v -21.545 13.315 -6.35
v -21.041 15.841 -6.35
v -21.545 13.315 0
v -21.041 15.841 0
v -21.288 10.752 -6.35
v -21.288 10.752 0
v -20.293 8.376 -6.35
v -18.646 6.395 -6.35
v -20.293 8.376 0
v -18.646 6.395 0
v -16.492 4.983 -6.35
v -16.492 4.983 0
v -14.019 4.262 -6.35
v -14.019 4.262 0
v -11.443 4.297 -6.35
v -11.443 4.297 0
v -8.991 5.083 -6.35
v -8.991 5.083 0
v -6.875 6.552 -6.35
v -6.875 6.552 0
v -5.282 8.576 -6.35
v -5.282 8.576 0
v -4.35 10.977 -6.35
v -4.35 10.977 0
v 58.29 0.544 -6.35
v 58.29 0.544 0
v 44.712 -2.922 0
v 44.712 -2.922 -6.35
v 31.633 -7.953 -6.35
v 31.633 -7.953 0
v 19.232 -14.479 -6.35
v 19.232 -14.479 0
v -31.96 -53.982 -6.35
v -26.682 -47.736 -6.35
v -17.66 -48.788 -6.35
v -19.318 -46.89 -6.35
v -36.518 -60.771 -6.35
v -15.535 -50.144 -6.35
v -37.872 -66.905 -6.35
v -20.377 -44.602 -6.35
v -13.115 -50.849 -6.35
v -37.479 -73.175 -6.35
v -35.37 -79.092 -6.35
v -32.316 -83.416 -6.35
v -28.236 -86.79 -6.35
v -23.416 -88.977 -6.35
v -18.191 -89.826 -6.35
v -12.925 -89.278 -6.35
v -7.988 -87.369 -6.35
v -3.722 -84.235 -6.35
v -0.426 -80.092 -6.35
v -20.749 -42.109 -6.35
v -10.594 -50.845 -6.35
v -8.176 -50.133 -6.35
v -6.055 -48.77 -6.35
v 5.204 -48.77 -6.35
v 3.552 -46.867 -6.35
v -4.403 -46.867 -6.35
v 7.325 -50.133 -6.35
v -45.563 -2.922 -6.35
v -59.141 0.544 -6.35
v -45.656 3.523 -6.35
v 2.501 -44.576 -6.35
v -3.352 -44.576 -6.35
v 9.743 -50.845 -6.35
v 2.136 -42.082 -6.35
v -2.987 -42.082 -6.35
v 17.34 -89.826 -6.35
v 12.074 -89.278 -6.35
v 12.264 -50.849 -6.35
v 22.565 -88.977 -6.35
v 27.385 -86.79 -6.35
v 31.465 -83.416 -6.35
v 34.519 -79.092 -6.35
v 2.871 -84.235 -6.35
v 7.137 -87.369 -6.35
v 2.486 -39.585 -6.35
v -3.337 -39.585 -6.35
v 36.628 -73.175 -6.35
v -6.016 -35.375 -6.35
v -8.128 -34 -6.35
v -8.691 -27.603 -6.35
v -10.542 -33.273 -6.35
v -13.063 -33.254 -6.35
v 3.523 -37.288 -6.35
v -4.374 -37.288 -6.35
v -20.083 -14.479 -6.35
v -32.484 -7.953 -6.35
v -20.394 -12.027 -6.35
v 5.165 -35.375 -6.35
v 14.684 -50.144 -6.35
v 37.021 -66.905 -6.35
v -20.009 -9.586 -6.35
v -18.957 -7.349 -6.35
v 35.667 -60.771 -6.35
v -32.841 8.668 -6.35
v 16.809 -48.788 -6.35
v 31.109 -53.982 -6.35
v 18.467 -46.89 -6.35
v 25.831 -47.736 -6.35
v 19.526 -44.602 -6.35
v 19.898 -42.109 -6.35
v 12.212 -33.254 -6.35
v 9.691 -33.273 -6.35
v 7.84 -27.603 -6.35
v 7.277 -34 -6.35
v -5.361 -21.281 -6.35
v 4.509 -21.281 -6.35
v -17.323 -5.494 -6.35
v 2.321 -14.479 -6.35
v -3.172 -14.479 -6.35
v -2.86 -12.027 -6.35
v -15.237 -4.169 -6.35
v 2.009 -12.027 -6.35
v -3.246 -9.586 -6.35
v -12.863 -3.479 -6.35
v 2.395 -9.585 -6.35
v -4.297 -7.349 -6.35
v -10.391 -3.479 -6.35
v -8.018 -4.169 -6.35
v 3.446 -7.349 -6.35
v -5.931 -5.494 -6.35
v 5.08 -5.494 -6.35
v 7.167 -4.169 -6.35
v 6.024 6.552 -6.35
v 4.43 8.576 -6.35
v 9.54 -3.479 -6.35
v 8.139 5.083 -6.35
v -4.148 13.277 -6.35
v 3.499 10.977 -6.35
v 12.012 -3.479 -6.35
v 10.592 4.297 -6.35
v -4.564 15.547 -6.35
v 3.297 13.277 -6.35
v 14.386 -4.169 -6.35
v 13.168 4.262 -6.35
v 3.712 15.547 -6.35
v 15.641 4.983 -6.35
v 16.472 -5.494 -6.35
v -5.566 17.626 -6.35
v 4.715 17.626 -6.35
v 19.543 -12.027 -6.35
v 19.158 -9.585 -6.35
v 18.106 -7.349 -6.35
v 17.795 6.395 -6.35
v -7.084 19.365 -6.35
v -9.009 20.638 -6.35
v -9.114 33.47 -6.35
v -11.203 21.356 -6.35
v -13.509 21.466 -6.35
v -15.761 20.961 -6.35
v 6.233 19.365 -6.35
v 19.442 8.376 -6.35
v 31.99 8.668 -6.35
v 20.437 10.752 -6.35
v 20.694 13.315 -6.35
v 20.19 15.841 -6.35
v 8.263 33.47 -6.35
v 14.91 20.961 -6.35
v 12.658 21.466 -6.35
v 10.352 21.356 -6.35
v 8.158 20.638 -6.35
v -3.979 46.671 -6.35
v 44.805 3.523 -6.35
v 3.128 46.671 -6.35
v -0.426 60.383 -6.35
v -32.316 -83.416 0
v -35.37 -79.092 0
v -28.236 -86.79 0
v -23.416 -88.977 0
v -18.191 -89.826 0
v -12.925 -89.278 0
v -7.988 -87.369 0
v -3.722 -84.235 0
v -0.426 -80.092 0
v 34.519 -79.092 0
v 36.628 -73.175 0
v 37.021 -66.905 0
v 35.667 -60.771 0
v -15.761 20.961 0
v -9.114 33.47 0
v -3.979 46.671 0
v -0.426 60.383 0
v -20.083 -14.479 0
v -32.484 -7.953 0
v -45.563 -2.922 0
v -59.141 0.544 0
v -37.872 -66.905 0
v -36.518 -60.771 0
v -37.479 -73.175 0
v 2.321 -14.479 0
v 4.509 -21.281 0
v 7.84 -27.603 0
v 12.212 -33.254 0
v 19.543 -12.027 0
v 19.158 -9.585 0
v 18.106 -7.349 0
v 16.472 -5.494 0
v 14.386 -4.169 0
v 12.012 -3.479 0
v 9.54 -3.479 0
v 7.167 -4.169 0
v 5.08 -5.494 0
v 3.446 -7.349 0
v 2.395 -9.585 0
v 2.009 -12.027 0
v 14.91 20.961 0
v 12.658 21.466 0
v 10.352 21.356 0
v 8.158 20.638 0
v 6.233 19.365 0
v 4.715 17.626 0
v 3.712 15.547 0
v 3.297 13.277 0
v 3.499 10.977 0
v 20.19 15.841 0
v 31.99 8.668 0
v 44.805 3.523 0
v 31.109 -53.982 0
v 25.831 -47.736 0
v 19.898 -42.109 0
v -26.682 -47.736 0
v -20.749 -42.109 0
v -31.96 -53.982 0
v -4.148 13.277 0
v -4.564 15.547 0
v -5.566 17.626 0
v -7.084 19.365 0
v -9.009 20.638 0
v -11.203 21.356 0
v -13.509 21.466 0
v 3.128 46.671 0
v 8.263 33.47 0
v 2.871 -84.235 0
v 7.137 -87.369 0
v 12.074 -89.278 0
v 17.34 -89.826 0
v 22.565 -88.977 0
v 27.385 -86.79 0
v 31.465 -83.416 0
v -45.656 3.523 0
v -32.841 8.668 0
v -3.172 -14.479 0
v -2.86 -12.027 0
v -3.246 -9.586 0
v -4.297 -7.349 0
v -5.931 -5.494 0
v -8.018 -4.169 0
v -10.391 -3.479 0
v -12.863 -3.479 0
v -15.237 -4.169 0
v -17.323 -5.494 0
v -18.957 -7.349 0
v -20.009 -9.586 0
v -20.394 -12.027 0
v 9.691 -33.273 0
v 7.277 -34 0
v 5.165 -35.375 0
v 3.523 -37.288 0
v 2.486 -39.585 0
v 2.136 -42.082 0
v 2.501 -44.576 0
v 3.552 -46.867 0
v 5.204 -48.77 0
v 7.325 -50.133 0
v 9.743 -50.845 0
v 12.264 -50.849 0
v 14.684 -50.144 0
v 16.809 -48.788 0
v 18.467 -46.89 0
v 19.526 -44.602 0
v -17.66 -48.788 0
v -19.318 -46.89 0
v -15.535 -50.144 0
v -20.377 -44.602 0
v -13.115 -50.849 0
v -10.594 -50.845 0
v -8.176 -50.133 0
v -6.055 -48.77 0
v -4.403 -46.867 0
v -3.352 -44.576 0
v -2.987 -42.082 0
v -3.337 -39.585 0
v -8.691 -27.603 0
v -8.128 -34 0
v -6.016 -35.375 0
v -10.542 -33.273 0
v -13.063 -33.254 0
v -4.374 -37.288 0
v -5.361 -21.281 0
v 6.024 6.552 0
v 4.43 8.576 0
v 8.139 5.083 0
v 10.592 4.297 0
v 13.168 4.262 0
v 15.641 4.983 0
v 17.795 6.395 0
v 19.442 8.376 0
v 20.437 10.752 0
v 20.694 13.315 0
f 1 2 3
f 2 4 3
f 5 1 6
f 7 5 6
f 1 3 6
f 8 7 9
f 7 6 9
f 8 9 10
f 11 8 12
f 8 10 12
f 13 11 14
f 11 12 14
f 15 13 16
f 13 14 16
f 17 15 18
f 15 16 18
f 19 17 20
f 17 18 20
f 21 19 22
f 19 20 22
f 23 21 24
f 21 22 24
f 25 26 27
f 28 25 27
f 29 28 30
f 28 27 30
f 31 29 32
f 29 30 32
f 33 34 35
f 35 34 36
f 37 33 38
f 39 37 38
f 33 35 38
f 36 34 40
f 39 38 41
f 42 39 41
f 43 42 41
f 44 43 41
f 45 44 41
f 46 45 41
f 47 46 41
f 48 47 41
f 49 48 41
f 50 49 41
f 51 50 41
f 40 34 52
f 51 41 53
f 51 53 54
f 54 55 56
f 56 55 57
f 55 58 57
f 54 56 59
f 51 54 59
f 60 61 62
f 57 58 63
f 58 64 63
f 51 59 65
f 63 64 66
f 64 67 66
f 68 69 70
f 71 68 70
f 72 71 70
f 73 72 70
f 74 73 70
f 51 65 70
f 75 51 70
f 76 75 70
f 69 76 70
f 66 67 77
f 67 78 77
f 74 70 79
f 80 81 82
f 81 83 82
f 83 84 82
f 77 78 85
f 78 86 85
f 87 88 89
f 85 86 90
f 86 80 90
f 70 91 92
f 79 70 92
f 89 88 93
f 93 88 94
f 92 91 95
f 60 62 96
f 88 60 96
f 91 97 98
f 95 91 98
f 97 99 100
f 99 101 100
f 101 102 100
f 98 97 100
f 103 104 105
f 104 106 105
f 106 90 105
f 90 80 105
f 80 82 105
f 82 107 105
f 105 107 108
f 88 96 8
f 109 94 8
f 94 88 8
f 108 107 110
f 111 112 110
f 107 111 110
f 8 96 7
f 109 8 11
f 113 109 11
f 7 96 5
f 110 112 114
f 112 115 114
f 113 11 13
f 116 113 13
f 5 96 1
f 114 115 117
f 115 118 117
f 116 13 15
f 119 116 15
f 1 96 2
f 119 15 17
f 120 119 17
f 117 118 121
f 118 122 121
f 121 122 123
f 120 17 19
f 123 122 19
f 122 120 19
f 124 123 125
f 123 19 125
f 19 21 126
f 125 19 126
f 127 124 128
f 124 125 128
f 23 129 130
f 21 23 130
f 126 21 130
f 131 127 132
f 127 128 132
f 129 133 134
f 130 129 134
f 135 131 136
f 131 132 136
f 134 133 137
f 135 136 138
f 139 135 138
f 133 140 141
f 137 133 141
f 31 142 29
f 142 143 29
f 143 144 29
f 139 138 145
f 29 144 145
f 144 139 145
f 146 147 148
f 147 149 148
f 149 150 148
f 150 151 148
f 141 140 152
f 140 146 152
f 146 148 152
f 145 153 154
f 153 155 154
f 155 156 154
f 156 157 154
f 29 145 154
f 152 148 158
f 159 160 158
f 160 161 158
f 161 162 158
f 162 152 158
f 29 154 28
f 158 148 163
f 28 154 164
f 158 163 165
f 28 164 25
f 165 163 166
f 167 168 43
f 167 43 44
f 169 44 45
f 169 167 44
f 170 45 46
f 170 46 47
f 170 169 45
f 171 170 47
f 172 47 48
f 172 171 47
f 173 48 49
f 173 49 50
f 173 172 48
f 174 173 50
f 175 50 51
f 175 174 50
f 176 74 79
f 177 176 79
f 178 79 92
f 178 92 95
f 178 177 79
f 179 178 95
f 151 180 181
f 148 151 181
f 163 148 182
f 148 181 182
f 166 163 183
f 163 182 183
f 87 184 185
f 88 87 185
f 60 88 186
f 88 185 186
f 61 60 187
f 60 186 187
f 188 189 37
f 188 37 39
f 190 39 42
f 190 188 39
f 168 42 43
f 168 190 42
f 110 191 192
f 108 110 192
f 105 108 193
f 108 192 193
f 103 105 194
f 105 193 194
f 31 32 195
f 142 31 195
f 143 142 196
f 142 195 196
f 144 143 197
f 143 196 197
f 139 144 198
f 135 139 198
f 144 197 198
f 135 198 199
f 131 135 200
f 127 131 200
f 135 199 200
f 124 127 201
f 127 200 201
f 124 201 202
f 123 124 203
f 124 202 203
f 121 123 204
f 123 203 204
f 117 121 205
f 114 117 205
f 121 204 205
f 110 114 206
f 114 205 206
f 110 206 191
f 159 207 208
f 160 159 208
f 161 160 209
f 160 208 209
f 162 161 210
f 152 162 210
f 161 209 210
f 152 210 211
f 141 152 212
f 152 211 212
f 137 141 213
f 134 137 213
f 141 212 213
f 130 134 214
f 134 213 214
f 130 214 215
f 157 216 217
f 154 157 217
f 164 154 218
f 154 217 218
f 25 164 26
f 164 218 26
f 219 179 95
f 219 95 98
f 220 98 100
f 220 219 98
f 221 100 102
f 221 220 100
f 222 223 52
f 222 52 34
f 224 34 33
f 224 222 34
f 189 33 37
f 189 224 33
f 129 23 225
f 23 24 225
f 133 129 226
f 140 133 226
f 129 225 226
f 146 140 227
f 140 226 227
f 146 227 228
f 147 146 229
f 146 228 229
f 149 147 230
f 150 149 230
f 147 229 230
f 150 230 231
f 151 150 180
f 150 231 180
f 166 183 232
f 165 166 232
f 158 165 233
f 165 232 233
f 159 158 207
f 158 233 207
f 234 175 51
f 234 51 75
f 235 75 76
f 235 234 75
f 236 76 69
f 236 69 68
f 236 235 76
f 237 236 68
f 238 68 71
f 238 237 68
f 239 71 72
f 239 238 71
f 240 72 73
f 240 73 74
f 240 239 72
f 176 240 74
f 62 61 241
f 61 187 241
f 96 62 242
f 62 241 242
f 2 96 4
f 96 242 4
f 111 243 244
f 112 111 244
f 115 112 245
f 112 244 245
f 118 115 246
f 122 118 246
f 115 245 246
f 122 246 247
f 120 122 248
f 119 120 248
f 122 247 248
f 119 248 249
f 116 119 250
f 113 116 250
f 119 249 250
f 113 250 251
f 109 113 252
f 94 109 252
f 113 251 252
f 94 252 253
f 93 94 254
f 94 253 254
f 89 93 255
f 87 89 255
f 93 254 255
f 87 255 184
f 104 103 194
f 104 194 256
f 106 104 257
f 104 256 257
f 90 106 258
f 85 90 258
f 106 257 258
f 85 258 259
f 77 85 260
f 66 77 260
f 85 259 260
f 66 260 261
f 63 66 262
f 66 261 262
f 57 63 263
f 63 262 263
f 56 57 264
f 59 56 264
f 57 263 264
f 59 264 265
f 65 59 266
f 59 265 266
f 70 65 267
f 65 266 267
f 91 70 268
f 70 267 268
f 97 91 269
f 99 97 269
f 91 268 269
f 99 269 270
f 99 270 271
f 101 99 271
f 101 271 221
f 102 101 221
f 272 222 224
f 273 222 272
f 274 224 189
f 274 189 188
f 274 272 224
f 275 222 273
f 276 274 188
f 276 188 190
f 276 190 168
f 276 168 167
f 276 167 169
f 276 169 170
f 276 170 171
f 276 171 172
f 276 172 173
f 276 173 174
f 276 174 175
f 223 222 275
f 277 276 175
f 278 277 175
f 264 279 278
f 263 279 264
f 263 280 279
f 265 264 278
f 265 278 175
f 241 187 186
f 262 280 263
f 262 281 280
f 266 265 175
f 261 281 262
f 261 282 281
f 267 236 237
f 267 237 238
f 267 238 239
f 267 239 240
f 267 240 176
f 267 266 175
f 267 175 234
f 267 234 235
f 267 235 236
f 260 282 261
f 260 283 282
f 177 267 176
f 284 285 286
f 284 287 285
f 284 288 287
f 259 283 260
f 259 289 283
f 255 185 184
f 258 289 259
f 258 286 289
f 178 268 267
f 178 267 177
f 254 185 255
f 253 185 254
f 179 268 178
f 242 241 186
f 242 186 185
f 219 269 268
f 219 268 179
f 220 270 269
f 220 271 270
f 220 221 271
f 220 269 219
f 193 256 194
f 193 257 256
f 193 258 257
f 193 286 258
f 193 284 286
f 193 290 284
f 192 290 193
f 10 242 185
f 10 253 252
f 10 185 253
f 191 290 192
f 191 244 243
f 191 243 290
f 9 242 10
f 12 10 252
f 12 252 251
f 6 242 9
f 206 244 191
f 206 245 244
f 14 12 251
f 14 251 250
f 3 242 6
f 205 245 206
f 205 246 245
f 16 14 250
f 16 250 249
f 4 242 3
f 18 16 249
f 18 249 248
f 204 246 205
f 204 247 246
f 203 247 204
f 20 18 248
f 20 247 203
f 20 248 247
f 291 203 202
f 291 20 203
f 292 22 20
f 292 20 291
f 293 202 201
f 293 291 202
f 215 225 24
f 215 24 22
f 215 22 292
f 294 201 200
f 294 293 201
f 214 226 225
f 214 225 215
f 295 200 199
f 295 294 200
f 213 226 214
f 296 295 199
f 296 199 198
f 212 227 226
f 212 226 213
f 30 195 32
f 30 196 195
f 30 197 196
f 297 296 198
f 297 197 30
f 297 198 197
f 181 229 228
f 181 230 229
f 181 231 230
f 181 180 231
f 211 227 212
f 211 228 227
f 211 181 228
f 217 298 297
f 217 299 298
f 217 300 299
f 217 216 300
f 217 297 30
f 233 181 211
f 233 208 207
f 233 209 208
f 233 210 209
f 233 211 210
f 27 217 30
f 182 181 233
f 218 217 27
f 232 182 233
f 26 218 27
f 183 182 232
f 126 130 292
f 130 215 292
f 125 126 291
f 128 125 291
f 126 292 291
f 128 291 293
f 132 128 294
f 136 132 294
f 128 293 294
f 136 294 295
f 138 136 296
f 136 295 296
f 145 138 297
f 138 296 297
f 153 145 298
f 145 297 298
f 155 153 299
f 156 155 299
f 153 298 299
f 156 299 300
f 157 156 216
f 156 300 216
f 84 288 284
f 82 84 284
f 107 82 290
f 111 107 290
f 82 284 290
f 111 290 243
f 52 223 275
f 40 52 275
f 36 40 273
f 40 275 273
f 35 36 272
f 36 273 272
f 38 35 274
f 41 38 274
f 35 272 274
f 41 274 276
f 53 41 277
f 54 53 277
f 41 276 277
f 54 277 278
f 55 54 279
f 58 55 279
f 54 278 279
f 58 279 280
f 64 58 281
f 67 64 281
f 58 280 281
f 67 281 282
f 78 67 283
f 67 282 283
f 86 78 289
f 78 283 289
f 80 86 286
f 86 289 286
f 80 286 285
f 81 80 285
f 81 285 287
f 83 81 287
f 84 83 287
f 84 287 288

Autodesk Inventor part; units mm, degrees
ref_plane "YZ Plane" through (0, 0, 0) normal (1, 0, 0) x (0, 1, 0)
ref_plane "XZ Plane" through (0, 0, 0) normal (0, 1, 0) x (-1, 0, 0)
ref_plane "XY Plane" through (0, 0, 0) normal (0, 0, 1) x (1, 0, 0)
sketch "Sketch1" plane through (0, 0, 0) normal (0, 0, 1) x (1, 0, 0)
  line L0 (-63.3467, 63.7292) -> (61.9288, 63.7292) construction
  line L1 (61.9288, 63.7292) -> (61.9288, -93.0802) construction
  line L2 (61.9288, -93.0802) -> (-63.3467, -93.0802) construction
  line L3 (-63.3467, -93.0802) -> (-63.3467, 63.7292) construction
  line L4 (-0.4255, 162.4475) -> (-0.4255, -218.5525) construction
  line L5 (-278.9224, 0) -> (102.0776, 0) construction
  line L6 (-278.9224, 0) -> (-0.4255, 162.4475) construction
  arc A0 (58.2895, 0.5442) -> (19.2318, -14.4791) centre (81.0298, -116.8596) ccw
  arc A1 (20.1895, 15.8408) -> (58.2895, 0.5442) centre (69.6342, 83.8982) ccw
  arc A2 (3.4987, 10.9772) -> (20.1895, 15.8408) centre (11.9947, 12.8921) ccw
  arc A3 (14.9097, 20.9609) -> (3.4987, 10.9772) centre (11.9125, 12.8736) ccw
  arc A4 (-0.4255, 60.3831) -> (14.9097, 20.9609) centre (117.9773, 83.748) ccw
  arc A5 (-20.0828, -14.4791) -> (-59.1406, 0.5442) centre (-81.8808, -116.8596) ccw
  arc A6 (-59.1406, 0.5442) -> (-21.0406, 15.8408) centre (-70.4853, 83.8982) ccw
  arc A7 (-21.0406, 15.8408) -> (-4.3498, 10.9772) centre (-12.8458, 12.8921) ccw
  arc A8 (-4.3498, 10.9772) -> (-15.7608, 20.9609) centre (-12.7635, 12.8736) ccw
  arc A9 (-15.7608, 20.9609) -> (-0.4255, 60.3831) centre (-118.8283, 83.748) ccw
  arc A10 (-3.1718, -14.4791) -> (-20.0828, -14.4791) centre (-11.6273, -12.1596) ccw
  arc A11 (-20.7493, -42.1086) -> (-13.0628, -33.2545) centre (-11.868, -42.0552) ccw
  arc A12 (-13.0628, -33.2545) -> (-3.1718, -14.4791) centre (-43.3622, -5.2995) ccw
  arc A13 (-35.3697, -79.0918) -> (-0.4255, -80.0922) centre (-17.6172, -69.795) ccw
  arc A14 (-36.5183, -60.7711) -> (-35.3697, -79.0918) centre (-15.4207, -68.6447) ccw
  arc A15 (-20.7493, -42.1086) -> (-36.5183, -60.7711) centre (27.2745, -98.6799) ccw
  arc A16 (19.2318, -14.4791) -> (2.3207, -14.4791) centre (10.7762, -12.1596) ccw
  arc A17 (12.2117, -33.2545) -> (19.8983, -42.1086) centre (11.0169, -42.0552) ccw
  arc A18 (2.3207, -14.4791) -> (12.2117, -33.2545) centre (42.5111, -5.2995) ccw
  arc A19 (-0.4255, -80.0922) -> (34.5187, -79.0918) centre (16.7661, -69.795) ccw
  arc A20 (34.5187, -79.0918) -> (35.6673, -60.7711) centre (14.5697, -68.6447) ccw
  arc A21 (35.6673, -60.7711) -> (19.8983, -42.1086) centre (-28.1255, -98.6799) ccw
  point P0 (0, 0)
  point P1 (-15.8877, 20.9609)
  point P2 (3.8205, 5.0713)
  dimension "d3" = 381
  dimension "d6" = 381
  dimension "d11" = 38.1
extrude "Extrusion1" add sketch "Sketch1" against normal blind 6.35
properties part number "Nobody Emblem"
